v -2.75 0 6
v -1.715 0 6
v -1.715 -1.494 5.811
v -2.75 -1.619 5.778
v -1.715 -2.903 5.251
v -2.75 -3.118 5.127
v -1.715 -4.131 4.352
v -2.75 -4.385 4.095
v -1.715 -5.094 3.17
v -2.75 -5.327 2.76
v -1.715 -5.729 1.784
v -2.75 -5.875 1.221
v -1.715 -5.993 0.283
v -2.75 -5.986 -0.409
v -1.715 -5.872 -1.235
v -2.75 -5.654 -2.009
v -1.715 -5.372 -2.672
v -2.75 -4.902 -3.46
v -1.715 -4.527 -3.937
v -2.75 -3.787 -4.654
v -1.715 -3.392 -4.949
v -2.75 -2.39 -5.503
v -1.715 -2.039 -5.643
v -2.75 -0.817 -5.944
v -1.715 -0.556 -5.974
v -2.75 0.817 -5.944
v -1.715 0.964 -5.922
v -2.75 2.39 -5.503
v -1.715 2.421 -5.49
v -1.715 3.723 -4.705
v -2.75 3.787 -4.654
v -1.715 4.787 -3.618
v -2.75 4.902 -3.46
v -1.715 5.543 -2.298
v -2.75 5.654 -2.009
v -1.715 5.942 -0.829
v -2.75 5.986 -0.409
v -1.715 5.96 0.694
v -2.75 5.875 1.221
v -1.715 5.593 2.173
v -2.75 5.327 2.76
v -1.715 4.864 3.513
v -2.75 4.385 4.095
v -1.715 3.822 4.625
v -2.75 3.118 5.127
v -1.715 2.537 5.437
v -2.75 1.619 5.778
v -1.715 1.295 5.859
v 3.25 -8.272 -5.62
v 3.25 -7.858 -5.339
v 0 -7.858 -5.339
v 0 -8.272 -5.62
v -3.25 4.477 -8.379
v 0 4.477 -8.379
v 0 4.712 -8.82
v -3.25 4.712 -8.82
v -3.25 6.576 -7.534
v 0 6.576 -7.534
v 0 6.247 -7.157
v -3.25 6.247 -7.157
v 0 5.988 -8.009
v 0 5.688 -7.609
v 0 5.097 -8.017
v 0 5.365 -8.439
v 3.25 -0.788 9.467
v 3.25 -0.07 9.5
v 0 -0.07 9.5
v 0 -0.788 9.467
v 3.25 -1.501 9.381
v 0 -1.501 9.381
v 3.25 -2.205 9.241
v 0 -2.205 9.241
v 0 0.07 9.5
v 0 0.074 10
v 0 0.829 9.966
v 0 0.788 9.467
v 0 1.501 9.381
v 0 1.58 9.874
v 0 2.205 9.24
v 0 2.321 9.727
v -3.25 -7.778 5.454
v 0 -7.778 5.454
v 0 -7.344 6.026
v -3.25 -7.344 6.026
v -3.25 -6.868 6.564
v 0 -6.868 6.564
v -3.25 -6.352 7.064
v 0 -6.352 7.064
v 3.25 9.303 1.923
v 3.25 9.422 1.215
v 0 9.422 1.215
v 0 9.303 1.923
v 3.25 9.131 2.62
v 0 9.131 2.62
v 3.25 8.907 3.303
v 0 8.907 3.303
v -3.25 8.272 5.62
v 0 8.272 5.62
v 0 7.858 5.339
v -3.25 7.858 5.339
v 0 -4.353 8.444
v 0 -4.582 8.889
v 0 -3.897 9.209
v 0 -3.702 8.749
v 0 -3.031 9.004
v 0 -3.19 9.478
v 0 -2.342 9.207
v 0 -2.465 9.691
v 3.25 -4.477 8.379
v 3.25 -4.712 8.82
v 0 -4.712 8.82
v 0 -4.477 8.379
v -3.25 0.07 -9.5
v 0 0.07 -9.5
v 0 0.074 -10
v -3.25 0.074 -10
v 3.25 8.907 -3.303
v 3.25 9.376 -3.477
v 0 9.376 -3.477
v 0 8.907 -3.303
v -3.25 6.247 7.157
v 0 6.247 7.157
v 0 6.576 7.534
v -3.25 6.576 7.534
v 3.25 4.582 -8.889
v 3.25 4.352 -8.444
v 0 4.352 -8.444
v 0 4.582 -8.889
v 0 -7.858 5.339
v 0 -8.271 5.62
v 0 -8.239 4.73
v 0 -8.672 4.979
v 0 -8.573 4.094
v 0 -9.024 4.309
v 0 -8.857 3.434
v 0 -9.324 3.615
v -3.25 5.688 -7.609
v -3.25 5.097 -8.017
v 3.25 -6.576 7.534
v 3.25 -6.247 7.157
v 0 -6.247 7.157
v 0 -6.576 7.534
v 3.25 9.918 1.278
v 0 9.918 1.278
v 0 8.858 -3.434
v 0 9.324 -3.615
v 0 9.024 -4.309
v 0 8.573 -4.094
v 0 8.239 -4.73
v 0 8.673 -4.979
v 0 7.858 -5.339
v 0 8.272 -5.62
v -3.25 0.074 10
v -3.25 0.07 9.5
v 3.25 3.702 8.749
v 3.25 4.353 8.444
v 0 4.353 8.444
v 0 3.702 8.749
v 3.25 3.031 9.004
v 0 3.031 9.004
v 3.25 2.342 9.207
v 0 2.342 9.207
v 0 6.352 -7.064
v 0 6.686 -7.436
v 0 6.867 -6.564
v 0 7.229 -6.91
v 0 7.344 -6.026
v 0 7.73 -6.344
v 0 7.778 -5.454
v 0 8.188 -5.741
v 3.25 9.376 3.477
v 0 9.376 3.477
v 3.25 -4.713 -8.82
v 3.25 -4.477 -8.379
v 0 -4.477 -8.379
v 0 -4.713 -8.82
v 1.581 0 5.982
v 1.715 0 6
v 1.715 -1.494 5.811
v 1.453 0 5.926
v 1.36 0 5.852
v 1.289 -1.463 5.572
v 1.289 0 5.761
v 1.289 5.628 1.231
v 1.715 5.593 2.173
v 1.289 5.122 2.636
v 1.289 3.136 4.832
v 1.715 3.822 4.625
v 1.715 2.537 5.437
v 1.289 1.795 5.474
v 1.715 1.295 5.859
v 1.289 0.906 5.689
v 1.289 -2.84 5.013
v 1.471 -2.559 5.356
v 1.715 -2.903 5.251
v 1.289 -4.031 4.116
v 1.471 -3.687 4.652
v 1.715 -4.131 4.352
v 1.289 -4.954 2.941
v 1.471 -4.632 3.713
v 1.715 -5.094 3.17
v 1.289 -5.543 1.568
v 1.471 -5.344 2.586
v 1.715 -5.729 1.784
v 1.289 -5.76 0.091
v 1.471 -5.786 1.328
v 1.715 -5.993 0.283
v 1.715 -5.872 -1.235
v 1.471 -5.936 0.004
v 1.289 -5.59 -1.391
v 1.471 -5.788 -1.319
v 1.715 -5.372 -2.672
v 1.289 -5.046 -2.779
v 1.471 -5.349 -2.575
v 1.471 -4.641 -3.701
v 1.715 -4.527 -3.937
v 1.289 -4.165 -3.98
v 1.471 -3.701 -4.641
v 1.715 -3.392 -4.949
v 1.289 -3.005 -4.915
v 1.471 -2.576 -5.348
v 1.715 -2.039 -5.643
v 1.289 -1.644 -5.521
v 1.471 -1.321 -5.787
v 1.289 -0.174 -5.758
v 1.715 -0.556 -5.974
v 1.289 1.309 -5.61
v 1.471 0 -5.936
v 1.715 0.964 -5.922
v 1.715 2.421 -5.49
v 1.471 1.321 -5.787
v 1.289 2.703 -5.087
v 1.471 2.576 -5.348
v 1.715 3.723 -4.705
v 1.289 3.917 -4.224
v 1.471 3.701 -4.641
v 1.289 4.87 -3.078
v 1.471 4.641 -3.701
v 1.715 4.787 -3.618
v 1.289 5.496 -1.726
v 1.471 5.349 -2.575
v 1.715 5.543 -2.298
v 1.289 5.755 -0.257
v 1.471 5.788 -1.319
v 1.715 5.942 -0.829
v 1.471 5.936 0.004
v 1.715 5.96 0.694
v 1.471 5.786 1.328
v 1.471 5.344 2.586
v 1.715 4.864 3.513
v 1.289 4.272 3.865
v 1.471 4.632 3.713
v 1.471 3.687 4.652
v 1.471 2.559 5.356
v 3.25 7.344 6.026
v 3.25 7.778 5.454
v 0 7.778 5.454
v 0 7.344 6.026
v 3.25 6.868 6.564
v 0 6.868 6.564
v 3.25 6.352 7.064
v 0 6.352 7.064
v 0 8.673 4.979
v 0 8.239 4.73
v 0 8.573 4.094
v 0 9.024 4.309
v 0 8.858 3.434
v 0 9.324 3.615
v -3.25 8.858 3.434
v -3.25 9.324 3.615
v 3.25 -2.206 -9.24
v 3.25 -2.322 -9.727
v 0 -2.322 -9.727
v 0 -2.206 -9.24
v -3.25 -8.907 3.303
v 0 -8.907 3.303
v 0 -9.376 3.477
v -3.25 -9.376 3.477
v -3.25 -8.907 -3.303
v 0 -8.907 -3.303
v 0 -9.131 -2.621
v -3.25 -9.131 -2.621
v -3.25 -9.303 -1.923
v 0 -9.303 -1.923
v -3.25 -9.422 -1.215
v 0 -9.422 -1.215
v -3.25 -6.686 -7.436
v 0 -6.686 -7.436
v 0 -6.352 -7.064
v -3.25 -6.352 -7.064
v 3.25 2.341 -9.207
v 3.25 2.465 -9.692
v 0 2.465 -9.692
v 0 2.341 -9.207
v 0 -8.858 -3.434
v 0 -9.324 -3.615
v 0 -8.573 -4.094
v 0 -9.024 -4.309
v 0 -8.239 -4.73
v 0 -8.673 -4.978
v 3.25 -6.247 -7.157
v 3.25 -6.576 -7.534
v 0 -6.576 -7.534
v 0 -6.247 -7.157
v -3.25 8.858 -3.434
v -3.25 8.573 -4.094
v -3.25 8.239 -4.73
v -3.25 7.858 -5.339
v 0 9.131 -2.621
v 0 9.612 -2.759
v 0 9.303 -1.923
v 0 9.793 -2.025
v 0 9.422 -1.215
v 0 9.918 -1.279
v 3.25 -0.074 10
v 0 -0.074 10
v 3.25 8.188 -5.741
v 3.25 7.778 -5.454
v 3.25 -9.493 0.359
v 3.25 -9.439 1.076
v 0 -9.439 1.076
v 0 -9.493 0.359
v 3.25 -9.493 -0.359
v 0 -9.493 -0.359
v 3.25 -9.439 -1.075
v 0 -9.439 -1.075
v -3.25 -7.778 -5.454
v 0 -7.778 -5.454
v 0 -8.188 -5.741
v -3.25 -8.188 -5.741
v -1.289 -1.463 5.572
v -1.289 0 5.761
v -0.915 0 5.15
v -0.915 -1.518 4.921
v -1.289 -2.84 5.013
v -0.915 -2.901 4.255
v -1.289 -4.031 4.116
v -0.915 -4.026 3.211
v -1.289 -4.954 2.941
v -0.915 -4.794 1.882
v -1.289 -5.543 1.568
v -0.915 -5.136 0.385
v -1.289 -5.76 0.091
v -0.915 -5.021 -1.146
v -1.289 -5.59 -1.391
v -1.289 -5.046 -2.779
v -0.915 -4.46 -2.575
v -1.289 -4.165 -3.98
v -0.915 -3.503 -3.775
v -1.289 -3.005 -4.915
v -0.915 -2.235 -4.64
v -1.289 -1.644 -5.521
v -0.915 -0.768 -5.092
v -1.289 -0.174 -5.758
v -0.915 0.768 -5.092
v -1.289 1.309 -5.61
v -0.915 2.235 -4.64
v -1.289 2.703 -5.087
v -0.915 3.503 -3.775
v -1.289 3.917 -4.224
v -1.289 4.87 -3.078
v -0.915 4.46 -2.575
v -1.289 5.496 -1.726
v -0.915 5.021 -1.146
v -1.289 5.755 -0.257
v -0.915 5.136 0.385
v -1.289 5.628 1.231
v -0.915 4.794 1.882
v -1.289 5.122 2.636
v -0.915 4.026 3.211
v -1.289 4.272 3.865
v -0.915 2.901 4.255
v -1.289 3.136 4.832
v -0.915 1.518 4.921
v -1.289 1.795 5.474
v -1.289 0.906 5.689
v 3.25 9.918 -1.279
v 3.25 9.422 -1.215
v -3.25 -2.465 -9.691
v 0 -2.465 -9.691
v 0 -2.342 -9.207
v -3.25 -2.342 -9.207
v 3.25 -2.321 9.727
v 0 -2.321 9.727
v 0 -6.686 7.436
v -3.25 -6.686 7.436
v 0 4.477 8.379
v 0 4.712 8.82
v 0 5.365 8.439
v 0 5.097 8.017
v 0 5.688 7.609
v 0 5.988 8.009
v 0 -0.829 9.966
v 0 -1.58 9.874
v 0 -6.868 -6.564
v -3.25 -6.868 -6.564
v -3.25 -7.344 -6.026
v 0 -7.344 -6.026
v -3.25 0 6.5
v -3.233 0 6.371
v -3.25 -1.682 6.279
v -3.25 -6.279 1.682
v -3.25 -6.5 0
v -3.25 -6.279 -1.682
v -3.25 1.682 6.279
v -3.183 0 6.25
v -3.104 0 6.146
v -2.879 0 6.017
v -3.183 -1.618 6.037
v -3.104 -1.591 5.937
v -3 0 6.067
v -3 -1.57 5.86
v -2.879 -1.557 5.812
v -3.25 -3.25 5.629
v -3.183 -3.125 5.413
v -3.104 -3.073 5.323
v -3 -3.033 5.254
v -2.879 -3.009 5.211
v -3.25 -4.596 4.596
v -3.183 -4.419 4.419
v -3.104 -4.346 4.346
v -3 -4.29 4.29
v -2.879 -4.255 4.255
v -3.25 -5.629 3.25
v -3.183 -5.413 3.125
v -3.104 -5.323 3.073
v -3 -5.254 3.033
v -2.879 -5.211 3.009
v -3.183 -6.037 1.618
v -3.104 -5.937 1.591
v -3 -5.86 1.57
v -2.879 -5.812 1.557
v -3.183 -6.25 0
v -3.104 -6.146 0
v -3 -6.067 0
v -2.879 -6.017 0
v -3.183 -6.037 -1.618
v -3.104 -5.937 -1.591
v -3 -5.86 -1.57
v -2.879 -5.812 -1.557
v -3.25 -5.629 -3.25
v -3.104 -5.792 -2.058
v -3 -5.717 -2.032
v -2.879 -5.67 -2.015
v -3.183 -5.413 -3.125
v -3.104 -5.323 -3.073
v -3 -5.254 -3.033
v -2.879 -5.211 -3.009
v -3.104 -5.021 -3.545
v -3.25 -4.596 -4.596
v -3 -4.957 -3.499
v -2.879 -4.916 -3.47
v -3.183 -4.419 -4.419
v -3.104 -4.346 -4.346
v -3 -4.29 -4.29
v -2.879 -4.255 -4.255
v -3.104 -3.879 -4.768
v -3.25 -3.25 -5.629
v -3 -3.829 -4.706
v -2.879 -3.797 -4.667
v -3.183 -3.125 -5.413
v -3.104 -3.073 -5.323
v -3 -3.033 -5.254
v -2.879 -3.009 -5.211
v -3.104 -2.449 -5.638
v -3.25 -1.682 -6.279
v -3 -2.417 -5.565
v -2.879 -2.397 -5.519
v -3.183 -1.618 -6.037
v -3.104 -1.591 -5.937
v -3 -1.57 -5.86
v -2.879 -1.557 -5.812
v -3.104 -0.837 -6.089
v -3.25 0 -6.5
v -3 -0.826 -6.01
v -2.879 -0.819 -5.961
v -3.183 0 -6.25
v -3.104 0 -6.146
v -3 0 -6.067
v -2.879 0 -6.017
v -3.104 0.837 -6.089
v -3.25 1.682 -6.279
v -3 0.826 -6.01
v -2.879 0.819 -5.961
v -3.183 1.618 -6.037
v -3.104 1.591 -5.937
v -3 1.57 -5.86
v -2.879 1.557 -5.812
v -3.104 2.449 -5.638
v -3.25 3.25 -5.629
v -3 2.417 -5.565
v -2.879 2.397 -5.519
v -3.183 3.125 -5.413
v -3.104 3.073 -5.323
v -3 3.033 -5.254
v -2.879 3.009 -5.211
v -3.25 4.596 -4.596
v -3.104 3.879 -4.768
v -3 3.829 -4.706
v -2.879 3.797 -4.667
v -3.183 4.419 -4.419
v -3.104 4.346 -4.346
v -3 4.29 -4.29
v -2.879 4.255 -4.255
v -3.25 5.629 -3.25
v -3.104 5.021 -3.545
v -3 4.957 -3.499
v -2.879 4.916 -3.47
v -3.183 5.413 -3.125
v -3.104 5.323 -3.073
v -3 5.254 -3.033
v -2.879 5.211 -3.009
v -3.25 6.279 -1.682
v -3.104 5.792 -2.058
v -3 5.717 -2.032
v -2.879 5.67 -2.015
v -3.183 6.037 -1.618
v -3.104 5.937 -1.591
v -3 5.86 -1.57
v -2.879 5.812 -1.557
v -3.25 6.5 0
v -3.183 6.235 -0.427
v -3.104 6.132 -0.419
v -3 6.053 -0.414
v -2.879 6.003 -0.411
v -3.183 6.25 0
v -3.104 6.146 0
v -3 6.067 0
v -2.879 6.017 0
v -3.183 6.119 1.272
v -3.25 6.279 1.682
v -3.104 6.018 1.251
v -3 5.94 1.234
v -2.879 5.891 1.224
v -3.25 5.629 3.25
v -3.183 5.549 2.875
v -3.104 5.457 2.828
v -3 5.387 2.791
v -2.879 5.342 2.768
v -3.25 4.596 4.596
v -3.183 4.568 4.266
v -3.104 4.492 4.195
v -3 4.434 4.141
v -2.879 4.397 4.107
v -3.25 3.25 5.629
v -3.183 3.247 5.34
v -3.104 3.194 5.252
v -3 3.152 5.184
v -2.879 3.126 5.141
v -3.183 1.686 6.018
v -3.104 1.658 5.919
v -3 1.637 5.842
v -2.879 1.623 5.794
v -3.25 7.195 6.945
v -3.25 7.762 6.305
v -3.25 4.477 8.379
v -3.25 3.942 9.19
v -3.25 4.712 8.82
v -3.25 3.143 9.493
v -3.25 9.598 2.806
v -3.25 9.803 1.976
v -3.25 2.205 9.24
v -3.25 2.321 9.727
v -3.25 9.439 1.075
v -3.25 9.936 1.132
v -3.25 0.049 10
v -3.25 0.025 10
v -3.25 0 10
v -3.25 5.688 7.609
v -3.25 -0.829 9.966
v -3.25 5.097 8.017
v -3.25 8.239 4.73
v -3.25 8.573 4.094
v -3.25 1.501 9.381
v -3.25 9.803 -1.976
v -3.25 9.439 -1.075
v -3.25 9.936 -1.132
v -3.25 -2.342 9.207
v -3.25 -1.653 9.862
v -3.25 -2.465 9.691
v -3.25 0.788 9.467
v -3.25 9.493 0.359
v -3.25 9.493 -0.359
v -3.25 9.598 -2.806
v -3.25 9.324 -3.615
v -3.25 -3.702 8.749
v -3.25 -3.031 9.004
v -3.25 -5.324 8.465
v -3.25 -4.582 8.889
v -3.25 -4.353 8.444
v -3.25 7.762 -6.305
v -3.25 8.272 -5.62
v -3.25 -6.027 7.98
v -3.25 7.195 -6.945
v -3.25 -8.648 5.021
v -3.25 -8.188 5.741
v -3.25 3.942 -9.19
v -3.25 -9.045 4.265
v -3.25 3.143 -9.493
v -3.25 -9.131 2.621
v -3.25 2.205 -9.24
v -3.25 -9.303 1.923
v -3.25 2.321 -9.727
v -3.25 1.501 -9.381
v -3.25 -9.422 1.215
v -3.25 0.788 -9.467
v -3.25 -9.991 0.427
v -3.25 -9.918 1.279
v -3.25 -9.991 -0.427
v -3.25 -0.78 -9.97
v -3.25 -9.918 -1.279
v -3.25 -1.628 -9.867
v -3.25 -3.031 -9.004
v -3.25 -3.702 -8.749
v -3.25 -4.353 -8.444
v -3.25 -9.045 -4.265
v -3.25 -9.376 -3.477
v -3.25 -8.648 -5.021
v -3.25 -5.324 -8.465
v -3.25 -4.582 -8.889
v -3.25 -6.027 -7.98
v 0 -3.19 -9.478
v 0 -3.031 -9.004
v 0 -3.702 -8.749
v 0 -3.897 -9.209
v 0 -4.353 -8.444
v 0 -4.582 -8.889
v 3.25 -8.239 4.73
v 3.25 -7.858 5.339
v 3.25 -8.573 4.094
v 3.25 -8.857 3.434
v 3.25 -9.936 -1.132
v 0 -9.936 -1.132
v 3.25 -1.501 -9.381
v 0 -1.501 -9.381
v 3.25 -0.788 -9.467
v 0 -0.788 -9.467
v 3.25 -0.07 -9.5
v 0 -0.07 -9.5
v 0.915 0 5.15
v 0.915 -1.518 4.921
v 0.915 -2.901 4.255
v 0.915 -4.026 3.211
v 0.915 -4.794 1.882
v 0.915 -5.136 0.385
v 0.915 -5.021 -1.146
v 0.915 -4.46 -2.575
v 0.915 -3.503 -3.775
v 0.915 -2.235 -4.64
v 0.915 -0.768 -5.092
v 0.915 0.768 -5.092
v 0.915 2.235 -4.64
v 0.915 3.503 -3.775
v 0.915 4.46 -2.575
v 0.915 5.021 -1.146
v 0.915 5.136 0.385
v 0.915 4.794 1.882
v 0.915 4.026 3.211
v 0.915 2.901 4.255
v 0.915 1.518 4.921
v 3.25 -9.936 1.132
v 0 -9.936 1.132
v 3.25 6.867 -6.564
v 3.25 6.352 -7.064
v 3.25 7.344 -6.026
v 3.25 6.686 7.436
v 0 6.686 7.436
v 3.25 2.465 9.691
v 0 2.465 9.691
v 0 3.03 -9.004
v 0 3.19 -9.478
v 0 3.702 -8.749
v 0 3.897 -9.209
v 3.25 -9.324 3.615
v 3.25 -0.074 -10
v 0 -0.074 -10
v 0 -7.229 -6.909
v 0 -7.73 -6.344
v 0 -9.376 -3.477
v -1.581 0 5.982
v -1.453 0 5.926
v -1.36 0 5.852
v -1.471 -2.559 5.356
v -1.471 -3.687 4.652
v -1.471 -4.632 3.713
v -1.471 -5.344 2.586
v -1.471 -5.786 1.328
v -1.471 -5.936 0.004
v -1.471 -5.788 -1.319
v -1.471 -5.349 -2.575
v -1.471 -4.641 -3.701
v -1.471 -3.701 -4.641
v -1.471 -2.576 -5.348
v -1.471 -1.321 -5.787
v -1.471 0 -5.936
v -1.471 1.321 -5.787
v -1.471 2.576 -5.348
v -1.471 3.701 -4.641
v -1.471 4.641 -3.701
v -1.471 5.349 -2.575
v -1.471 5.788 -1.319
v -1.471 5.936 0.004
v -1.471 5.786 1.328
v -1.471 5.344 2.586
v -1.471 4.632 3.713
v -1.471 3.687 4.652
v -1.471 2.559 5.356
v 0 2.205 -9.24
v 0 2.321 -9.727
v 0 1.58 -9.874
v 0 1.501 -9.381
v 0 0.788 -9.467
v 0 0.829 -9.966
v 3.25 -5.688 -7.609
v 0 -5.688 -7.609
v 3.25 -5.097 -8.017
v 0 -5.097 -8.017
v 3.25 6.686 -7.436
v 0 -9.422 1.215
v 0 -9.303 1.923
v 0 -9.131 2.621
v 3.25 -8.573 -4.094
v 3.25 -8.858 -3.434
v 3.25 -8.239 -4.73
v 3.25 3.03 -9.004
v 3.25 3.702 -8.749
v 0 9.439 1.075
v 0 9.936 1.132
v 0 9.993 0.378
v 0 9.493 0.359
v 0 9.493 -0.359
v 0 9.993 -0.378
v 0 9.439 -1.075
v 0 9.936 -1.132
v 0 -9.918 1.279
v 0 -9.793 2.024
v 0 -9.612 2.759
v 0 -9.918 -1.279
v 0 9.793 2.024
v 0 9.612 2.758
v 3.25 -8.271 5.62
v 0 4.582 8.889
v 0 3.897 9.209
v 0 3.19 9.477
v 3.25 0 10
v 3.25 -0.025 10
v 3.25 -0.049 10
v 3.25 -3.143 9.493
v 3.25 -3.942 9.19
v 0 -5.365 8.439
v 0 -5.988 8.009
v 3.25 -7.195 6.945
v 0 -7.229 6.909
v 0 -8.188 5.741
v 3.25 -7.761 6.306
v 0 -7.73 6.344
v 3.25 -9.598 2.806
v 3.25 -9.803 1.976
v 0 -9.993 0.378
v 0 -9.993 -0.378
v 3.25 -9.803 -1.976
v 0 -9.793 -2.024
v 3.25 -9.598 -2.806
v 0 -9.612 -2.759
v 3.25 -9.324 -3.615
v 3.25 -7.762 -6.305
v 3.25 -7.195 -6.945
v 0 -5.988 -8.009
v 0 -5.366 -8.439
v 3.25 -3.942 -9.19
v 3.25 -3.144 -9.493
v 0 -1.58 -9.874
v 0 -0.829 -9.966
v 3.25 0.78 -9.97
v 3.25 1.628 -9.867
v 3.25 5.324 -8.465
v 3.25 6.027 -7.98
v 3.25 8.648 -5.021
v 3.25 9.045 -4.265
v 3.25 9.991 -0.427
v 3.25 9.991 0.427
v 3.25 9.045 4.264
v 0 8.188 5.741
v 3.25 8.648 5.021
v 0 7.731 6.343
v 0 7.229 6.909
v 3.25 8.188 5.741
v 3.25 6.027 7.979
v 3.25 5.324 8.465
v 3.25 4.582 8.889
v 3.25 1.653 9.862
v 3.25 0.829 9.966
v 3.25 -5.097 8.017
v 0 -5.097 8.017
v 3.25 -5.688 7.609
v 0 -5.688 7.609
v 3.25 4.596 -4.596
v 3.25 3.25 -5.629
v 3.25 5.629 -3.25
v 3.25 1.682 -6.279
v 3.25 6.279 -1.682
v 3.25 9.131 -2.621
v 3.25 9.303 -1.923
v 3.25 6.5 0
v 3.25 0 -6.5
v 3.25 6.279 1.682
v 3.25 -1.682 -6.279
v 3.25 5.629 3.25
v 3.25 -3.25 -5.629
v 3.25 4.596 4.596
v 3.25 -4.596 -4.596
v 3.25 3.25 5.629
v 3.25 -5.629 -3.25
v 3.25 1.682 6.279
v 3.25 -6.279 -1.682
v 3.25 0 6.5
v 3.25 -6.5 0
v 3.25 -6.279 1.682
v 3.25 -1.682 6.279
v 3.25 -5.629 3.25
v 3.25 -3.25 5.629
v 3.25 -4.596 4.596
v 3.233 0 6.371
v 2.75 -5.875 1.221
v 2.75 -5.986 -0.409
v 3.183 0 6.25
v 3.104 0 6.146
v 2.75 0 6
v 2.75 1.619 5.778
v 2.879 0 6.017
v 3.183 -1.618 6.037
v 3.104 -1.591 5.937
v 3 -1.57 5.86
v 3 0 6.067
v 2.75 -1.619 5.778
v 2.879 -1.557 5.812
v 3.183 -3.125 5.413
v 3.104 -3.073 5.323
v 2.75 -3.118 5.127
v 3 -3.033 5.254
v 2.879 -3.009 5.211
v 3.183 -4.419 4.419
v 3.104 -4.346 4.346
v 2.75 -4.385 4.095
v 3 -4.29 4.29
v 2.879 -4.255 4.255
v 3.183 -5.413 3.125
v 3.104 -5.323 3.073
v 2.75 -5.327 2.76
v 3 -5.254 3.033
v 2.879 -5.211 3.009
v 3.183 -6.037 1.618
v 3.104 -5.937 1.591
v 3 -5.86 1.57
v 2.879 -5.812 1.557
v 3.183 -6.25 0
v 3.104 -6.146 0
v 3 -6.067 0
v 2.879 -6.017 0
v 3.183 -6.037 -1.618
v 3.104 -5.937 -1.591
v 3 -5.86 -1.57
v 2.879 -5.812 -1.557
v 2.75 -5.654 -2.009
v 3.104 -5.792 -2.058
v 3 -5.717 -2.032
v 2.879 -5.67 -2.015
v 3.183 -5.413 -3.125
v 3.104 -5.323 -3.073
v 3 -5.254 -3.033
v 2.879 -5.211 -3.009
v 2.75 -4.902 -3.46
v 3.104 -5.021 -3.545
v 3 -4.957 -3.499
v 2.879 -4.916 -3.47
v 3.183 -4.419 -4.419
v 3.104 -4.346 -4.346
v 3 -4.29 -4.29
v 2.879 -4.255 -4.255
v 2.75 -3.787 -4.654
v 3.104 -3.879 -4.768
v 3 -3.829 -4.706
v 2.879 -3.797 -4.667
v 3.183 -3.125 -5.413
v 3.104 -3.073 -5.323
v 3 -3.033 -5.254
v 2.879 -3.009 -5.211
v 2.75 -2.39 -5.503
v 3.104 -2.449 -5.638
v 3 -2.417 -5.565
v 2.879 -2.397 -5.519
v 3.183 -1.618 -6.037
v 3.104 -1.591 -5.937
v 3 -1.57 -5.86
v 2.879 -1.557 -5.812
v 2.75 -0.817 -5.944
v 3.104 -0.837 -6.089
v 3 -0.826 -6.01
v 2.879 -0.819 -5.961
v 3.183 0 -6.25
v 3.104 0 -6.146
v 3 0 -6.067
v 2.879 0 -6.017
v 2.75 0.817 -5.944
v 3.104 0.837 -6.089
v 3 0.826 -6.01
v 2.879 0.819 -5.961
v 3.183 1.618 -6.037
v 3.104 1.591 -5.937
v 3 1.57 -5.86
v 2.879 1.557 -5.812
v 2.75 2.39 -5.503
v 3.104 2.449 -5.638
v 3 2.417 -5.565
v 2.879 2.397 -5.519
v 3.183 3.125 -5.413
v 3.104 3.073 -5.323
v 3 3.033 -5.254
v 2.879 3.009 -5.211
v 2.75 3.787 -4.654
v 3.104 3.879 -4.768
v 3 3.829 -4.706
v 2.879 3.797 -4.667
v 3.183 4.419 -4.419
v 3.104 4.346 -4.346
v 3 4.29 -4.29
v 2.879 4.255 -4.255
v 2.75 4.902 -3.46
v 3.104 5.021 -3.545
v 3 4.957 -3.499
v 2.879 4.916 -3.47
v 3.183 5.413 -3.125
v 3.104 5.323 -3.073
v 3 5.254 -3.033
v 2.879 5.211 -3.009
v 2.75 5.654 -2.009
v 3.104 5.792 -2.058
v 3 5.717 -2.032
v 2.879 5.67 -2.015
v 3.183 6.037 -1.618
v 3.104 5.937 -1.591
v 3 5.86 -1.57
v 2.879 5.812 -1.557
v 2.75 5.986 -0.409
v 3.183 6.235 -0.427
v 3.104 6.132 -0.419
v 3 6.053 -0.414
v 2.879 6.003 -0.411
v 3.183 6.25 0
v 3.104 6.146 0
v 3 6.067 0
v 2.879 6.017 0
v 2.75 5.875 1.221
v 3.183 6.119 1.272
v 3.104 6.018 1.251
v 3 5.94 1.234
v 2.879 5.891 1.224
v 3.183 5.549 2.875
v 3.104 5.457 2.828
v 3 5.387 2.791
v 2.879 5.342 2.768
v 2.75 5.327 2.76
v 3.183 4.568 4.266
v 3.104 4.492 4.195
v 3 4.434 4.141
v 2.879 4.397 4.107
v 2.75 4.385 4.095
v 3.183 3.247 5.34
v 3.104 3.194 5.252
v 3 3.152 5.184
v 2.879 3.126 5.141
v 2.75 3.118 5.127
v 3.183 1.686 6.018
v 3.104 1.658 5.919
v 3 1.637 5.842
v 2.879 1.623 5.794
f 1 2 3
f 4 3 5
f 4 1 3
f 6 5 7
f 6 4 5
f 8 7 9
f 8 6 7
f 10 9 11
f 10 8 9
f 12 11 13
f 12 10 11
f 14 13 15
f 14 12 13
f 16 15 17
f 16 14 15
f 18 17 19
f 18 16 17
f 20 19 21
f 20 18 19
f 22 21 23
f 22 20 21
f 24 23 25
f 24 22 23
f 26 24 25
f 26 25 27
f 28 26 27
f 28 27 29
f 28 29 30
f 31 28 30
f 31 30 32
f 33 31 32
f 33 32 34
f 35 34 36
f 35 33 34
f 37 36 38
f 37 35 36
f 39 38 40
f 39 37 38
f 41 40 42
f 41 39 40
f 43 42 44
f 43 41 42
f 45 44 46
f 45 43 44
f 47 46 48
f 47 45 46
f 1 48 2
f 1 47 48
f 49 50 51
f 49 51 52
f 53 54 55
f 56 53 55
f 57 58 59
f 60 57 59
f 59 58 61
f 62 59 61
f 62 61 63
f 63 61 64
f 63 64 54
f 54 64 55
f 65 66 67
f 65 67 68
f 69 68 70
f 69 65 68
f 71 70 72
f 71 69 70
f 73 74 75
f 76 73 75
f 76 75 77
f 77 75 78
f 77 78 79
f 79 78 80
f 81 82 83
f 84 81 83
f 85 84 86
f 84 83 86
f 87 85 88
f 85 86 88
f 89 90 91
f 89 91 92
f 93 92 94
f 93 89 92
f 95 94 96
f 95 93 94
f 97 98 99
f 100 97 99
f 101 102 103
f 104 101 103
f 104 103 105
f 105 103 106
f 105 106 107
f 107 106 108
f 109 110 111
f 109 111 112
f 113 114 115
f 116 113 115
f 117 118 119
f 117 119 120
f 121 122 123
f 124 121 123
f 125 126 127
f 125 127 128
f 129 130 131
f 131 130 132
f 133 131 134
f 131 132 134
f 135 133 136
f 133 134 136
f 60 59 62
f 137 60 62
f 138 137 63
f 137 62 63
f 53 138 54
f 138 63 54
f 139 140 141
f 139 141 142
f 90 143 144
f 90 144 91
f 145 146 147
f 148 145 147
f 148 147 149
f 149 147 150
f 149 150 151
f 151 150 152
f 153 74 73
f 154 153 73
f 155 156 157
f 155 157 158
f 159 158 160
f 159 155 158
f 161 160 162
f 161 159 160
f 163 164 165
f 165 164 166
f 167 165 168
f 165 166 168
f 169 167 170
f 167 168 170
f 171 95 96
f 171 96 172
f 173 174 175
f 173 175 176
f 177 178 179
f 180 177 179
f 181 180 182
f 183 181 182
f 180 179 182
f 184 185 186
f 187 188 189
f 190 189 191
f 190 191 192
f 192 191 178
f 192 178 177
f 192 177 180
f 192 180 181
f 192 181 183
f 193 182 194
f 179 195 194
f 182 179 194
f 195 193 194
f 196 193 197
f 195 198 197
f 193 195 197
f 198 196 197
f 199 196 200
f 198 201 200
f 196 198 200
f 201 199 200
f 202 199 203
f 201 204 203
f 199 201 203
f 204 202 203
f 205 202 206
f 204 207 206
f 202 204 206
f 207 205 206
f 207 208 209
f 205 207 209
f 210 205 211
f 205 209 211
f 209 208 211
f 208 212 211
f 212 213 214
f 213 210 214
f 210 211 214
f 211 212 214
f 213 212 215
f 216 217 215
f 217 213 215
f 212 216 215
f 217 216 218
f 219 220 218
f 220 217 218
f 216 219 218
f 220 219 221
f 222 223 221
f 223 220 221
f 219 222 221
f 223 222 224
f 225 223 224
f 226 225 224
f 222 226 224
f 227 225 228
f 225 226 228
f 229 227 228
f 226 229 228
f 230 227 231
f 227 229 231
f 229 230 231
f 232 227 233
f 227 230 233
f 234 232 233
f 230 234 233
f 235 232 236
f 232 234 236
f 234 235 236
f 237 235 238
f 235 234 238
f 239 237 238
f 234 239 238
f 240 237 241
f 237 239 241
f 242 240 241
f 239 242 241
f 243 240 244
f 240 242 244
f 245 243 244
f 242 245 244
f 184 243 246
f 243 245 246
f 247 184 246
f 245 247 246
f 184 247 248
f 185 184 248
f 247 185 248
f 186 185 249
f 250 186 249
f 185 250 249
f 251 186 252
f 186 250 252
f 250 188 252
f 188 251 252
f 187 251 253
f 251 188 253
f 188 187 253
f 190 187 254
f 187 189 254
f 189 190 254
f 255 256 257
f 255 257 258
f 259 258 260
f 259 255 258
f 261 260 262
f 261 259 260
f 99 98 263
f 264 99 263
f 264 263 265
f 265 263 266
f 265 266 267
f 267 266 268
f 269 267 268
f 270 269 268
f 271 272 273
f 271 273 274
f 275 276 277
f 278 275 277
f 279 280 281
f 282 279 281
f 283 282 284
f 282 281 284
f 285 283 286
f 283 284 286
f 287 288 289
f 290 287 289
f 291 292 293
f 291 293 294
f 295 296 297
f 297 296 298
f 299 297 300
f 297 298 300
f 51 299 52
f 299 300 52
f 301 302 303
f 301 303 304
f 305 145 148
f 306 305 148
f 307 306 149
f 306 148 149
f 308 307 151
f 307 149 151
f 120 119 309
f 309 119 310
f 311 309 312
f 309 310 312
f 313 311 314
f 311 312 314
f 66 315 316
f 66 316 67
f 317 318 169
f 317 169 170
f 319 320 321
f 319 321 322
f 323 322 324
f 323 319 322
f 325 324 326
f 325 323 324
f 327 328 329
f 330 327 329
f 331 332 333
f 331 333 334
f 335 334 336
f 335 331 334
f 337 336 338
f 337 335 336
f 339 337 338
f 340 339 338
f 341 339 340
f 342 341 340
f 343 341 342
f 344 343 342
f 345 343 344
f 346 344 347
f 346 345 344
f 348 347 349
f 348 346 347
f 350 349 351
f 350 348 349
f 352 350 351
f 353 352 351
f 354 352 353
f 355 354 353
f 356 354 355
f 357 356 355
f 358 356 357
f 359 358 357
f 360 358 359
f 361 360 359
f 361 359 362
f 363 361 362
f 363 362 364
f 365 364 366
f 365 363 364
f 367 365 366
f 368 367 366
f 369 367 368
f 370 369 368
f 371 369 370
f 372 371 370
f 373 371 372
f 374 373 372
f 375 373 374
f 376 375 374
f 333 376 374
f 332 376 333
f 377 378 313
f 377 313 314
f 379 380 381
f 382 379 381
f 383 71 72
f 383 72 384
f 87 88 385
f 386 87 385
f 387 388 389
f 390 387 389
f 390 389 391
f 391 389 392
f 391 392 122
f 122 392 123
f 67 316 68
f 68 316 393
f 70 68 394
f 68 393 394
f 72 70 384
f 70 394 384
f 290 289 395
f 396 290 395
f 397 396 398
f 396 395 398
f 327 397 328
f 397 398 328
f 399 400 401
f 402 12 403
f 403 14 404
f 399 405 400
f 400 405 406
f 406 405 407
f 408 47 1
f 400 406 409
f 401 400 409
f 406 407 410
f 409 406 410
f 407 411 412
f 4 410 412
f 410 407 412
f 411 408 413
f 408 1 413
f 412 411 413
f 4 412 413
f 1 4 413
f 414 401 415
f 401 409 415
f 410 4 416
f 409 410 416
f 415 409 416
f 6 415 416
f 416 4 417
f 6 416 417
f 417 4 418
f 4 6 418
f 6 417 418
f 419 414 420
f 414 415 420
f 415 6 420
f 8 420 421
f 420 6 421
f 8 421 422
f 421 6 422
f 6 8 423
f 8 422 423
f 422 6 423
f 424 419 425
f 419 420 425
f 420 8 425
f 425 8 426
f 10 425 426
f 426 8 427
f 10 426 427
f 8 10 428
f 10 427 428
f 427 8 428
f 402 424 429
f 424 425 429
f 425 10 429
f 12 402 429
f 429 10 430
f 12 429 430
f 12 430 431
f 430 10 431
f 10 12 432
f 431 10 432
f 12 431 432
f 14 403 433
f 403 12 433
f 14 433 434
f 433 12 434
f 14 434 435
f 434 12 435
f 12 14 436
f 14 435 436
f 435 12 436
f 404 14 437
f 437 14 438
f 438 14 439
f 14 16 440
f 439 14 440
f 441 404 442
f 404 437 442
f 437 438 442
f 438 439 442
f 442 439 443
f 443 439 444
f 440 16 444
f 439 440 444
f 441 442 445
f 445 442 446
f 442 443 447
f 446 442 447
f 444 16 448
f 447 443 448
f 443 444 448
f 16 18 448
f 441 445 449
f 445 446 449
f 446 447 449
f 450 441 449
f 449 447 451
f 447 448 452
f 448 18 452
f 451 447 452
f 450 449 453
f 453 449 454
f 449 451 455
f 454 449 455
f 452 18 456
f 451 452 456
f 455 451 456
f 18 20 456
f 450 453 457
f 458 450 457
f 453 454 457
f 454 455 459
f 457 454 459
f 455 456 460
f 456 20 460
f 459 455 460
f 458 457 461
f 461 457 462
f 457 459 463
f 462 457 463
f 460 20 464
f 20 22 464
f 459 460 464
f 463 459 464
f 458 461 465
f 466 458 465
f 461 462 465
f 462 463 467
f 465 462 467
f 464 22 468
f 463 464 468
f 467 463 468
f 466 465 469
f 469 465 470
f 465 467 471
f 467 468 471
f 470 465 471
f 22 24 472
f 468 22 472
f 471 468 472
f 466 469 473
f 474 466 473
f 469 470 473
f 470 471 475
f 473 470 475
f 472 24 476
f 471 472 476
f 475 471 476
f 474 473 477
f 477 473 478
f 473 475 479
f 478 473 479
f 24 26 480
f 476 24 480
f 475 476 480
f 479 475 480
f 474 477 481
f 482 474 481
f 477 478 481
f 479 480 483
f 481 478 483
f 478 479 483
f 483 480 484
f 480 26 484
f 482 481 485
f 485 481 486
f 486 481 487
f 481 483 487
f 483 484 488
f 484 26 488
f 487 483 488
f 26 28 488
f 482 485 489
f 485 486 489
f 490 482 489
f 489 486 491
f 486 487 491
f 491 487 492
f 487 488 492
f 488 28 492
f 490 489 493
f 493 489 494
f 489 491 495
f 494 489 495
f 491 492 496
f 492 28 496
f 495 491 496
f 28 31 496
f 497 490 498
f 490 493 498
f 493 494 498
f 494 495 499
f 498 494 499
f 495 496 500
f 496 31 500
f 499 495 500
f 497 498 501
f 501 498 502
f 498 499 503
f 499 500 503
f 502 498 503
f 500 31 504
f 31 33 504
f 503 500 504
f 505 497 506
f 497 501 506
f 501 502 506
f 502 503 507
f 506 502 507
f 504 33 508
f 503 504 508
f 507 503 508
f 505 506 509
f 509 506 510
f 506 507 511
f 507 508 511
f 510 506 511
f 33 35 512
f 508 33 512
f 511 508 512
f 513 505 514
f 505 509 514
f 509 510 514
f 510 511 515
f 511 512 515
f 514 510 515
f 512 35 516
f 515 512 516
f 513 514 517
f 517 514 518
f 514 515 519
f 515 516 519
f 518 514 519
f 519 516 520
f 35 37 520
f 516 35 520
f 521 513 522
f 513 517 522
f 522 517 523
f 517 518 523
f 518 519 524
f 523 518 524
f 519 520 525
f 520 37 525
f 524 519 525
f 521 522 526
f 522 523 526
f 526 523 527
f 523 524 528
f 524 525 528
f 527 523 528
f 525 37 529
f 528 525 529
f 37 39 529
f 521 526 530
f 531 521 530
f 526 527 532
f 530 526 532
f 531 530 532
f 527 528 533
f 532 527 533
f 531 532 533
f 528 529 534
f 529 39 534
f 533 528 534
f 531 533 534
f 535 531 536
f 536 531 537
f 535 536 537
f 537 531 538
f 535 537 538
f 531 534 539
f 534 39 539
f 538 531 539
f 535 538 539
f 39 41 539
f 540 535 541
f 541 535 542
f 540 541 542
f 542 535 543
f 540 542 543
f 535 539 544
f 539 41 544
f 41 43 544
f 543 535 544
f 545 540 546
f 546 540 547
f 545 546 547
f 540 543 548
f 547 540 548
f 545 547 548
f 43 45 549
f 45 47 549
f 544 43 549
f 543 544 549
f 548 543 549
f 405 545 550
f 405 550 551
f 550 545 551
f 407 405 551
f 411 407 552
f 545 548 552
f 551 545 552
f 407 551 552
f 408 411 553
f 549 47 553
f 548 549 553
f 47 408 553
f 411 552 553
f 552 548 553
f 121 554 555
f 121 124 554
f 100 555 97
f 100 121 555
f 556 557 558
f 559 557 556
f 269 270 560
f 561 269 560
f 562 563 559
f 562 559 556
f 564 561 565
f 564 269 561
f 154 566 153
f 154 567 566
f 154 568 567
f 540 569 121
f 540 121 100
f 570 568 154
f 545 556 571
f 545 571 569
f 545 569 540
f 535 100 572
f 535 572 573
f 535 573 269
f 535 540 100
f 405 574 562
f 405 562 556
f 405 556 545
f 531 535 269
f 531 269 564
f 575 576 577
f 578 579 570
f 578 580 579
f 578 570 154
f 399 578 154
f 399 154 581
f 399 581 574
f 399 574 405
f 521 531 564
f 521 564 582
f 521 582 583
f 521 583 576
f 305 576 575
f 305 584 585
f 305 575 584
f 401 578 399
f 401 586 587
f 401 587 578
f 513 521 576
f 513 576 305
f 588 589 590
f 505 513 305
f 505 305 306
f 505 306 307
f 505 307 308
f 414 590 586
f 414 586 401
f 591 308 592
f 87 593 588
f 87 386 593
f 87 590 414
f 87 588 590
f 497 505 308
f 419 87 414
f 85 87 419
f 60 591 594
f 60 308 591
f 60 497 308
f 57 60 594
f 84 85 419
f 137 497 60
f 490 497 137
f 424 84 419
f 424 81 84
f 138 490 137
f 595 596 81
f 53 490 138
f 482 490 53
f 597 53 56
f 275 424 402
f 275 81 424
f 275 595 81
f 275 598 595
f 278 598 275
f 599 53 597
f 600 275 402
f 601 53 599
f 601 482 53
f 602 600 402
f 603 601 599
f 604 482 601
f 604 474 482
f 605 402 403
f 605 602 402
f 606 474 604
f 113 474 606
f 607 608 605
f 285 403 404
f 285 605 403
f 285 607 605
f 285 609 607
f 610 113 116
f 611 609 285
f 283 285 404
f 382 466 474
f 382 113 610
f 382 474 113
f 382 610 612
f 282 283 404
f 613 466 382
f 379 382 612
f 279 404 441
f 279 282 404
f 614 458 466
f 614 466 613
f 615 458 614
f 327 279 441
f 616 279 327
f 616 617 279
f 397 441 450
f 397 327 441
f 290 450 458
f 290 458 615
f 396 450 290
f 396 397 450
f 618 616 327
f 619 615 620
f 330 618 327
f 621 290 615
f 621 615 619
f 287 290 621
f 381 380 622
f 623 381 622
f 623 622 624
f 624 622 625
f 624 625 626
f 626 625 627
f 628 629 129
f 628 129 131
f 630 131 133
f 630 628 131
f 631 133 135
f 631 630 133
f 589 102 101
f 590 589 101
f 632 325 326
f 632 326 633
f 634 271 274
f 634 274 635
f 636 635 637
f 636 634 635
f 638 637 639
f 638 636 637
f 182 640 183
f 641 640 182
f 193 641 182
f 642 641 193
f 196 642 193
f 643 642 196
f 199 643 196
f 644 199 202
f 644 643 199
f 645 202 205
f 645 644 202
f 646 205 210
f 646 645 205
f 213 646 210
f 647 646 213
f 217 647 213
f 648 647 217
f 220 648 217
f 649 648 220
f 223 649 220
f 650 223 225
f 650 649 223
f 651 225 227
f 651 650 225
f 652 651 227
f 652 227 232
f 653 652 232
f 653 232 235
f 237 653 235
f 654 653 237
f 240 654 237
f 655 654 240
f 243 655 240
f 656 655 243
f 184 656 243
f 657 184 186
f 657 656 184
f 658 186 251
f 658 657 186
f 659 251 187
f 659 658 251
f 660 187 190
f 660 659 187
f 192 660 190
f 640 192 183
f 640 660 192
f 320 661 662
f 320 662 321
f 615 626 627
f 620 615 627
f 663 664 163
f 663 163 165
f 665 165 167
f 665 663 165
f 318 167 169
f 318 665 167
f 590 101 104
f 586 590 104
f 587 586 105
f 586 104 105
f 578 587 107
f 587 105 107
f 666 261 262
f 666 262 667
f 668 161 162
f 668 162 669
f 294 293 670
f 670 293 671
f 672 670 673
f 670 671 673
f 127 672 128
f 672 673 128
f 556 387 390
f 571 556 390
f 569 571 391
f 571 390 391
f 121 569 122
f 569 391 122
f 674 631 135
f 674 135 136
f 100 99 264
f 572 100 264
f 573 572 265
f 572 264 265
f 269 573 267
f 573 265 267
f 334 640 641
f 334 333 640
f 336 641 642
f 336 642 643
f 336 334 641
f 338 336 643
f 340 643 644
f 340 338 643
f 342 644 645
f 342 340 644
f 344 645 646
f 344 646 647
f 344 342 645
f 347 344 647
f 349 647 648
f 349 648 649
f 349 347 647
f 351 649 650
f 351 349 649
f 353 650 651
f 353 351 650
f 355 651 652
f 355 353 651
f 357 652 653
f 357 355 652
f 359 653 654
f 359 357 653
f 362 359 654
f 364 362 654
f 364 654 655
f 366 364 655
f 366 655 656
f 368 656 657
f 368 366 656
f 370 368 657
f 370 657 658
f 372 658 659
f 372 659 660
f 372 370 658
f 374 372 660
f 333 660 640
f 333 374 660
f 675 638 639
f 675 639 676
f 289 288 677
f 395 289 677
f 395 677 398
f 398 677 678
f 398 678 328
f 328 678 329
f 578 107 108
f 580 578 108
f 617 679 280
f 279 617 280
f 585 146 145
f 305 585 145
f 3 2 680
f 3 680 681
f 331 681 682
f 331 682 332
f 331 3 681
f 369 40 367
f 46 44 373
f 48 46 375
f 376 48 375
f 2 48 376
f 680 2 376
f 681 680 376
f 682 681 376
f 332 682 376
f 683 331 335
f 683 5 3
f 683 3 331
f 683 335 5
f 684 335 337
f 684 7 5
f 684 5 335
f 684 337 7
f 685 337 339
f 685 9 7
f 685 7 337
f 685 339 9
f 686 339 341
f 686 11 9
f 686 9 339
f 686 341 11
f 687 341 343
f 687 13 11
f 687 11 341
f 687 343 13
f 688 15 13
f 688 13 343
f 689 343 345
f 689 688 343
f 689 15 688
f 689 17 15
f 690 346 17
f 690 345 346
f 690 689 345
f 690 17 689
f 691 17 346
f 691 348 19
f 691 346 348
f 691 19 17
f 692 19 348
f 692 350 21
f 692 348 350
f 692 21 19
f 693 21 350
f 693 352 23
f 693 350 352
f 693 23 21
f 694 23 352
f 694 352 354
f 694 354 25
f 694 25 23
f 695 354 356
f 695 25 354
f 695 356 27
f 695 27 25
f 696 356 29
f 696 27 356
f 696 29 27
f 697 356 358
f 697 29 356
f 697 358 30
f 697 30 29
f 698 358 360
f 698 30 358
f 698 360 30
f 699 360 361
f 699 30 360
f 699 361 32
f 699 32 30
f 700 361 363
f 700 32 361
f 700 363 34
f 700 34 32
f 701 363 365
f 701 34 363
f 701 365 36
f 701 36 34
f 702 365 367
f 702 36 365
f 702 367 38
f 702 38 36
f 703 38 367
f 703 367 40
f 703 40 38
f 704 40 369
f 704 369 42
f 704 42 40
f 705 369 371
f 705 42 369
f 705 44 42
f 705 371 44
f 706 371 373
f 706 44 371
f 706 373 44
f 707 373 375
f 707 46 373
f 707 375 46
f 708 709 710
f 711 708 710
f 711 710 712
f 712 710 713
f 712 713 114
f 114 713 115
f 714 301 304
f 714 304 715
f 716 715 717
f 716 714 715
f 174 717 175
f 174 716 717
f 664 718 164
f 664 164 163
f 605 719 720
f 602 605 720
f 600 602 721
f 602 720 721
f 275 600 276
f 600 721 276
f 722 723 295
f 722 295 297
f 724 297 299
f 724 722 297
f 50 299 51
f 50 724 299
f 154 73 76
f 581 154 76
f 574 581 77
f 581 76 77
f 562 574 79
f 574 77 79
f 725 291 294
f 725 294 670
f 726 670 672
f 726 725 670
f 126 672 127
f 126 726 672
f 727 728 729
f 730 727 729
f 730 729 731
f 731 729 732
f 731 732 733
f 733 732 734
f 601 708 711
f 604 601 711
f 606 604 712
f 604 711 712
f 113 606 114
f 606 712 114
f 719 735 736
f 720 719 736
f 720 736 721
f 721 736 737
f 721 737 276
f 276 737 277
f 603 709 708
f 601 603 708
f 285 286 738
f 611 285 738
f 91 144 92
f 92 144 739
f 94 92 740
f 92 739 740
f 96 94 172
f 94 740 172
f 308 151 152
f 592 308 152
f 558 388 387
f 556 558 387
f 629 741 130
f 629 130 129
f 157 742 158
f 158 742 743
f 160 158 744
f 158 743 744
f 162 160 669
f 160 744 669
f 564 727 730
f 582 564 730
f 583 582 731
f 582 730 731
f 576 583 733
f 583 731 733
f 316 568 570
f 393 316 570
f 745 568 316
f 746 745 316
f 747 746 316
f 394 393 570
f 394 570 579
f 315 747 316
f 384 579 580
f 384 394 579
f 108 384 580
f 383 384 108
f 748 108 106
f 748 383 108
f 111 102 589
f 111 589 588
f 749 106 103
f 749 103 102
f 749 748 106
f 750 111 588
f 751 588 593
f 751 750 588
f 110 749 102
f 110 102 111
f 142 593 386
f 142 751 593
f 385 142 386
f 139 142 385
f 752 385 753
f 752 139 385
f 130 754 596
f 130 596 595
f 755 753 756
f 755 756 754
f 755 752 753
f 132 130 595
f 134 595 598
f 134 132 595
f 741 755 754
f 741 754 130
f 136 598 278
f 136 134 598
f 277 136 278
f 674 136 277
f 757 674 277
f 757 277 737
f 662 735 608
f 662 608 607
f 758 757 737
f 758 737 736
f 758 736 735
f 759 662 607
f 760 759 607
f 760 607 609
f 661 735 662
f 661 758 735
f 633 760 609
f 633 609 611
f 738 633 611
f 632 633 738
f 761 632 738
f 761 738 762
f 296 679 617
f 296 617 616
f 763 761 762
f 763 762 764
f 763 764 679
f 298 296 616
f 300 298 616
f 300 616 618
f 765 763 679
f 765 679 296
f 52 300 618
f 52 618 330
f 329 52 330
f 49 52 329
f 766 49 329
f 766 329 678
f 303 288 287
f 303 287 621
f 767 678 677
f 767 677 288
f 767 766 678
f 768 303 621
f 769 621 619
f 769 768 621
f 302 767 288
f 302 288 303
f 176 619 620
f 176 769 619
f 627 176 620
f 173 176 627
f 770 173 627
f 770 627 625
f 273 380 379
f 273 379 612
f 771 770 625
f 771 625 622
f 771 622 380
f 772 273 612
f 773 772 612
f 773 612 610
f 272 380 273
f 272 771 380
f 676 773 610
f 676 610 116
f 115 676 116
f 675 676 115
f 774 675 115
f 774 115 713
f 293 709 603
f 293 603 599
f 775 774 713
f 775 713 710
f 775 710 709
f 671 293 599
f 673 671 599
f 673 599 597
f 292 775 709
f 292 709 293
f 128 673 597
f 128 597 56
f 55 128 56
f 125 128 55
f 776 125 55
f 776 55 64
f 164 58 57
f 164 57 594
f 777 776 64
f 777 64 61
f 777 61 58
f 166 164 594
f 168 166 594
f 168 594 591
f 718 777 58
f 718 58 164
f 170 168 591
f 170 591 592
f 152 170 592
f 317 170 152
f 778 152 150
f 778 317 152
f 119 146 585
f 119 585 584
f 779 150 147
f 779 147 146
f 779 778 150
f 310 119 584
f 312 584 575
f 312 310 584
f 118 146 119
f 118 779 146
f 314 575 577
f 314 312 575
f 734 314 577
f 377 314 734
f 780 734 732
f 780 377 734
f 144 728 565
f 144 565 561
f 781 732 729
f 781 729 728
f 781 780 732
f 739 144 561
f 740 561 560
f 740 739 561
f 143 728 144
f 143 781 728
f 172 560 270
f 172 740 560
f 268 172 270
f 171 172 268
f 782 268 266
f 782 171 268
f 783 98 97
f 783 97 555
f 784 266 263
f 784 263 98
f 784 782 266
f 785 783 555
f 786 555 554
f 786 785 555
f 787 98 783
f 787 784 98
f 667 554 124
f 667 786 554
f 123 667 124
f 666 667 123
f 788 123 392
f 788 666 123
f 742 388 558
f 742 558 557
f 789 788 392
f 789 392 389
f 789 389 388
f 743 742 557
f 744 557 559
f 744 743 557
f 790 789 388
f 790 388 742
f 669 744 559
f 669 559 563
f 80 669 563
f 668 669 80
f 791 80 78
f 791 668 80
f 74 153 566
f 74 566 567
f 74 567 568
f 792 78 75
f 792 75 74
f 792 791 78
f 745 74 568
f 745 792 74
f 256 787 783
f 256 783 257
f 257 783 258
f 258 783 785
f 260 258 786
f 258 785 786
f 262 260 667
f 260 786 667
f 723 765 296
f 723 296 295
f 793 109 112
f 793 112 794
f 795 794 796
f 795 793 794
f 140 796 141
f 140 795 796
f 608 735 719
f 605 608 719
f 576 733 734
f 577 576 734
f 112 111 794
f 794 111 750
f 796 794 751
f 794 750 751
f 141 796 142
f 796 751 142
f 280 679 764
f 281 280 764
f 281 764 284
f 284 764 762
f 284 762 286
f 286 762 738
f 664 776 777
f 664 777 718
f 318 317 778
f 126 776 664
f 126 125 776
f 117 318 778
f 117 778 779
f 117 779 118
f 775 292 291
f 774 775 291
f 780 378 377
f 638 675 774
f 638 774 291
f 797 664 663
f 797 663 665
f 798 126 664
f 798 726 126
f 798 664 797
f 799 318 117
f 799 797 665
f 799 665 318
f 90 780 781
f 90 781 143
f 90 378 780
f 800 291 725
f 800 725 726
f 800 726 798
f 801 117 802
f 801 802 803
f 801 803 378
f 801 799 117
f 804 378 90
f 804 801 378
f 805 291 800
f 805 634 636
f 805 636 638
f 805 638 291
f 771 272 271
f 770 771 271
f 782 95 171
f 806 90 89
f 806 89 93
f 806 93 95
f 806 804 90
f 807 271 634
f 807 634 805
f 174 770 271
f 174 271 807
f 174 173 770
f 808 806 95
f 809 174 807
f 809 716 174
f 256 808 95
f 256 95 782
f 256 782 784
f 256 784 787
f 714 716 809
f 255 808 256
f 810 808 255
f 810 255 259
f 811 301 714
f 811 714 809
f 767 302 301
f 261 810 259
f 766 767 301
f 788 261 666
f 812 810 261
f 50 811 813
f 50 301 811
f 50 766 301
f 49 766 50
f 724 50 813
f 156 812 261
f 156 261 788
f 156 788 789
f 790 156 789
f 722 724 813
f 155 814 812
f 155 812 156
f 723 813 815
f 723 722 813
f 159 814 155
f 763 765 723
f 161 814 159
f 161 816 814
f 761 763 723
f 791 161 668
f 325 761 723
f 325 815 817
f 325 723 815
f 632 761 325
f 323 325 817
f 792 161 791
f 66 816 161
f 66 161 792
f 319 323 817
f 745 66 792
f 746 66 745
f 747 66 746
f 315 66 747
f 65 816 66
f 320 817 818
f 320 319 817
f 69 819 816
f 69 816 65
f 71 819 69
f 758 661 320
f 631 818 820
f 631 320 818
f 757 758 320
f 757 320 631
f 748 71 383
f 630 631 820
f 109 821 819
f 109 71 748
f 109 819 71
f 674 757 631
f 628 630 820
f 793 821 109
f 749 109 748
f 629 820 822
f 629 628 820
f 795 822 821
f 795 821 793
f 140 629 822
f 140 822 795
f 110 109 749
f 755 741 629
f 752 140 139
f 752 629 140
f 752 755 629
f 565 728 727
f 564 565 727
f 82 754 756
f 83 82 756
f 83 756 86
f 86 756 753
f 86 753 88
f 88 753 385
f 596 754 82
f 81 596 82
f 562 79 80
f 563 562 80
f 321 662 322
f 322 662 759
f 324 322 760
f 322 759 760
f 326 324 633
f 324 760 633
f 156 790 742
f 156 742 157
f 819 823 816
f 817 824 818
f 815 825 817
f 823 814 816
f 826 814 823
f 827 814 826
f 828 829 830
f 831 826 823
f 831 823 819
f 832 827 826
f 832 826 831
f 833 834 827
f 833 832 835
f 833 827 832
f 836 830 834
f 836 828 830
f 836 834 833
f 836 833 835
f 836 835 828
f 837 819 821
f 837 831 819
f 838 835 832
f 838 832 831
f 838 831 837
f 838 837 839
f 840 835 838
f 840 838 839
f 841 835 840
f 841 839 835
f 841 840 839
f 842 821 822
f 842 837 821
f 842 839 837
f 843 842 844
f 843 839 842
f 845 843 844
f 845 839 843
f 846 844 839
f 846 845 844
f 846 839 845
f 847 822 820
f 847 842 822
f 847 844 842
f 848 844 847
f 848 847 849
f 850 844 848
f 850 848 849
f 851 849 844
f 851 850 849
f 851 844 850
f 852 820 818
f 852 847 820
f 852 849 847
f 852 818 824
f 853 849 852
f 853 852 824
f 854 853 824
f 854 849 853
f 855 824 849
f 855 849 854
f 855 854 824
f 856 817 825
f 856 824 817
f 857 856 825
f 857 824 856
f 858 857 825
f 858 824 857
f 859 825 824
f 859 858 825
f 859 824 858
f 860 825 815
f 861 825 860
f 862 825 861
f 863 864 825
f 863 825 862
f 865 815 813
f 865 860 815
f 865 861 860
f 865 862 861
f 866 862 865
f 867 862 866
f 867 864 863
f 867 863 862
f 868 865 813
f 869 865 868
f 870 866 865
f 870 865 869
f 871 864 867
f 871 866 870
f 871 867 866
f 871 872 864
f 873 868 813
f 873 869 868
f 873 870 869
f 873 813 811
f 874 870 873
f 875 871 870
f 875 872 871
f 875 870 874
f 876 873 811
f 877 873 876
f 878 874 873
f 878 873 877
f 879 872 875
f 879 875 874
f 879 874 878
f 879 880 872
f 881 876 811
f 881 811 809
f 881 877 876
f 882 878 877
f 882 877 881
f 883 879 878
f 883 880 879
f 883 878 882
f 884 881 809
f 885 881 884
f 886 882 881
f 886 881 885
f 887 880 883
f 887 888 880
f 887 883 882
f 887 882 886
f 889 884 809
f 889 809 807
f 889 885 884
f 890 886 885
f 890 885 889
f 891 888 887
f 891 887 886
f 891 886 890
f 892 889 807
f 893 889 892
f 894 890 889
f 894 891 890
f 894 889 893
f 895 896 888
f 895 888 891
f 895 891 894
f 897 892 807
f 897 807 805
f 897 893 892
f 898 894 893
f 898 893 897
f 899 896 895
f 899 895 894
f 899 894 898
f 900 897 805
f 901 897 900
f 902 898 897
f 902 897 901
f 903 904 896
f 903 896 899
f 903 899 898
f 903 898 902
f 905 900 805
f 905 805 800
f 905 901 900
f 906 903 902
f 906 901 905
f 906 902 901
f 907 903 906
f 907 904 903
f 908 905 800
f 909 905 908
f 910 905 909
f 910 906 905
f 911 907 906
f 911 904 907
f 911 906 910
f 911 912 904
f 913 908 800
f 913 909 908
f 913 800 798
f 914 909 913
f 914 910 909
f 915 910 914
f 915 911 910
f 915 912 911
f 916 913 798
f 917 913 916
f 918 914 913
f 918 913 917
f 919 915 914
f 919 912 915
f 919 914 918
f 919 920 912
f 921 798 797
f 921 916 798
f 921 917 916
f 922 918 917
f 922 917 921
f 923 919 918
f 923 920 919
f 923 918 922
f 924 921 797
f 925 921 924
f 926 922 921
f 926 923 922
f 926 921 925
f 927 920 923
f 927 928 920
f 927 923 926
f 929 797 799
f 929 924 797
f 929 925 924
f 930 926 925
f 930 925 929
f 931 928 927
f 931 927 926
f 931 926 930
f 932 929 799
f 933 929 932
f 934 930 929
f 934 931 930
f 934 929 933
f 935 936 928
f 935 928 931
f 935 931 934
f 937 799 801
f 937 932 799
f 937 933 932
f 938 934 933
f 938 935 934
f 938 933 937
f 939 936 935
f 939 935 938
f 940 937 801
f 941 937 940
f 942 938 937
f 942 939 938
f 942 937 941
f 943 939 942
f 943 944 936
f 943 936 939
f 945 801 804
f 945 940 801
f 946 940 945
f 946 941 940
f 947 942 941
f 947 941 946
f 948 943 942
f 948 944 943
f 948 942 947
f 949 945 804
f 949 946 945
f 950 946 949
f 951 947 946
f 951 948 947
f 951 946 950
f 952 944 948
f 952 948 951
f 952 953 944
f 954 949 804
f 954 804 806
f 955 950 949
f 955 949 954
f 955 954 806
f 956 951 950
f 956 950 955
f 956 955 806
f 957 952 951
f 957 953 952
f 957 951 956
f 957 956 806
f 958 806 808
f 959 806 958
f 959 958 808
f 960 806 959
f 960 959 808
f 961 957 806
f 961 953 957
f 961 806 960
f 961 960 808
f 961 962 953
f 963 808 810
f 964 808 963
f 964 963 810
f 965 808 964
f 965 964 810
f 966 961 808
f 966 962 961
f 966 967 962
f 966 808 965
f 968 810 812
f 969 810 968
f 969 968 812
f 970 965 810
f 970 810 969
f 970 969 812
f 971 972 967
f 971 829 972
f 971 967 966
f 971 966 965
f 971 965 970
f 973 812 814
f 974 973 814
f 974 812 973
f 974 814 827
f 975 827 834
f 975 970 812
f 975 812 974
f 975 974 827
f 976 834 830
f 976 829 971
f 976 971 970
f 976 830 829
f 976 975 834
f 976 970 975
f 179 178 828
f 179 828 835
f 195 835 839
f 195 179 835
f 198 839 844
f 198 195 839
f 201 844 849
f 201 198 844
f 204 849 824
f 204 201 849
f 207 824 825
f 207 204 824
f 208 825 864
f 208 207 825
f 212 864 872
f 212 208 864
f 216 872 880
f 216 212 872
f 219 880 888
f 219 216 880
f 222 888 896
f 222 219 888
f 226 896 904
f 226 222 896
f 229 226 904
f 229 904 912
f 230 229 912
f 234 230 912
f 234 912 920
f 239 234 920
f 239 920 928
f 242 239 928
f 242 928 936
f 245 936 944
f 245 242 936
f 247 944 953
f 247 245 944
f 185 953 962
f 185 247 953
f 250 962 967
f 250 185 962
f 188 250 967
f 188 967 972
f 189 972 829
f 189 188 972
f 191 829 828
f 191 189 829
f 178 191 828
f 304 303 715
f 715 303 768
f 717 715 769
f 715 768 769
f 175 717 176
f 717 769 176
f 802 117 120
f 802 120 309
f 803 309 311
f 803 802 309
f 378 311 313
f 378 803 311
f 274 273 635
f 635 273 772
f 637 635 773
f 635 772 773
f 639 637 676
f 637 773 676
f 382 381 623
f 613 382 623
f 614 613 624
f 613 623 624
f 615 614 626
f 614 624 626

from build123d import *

# Parameters (mm, degrees)
CUT_EXTRUDE1_START = -3.25
CUT_EXTRUDE1_DEPTH = 3.25
CIRPATTERN1_COUNT  = 13
CUT_EXTRUDE2_DEPTH = 3.25
CIRPATTERN2_COUNT  = 13
FILLET1_R          = 0.5


with BuildPart() as part:
    # Sketch1 → Revolve1 (revolve)
    with BuildSketch(Plane.XY, mode=Mode.PRIVATE) as revolve1_sk:
        Polygon((-3.25, 10), (3.25, 10), (3.25, 6), (1.435, 6), (0.915, 5.15), (-0.915, 5.15), (-1.435, 6), (-3.25, 6), align=None)
    revolve(revolve1_sk.sketch.rotate(Axis((0, 0, 0), (1, 0, 0)), 90), axis=Axis((0, 0, 0), (1, 0, 0)))

    # Sketch2 → Cut-Extrude1 (cut)
    with BuildSketch(Plane.ZY.offset(3.25).offset(CUT_EXTRUDE1_START)):
        with BuildLine():
            Line((-1.075430531, 9.438932629), (-1.132032138, 9.935718557))
            ThreePointArc((-1.132032138, 9.935718557), (0, 10), (1.132032138, 9.935718557))
            Line((1.132032138, 9.935718557), (1.075430531, 9.438932629))
            ThreePointArc((1.075430531, 9.438932629), (0, 9.5), (-1.075430531, 9.438932629))
        make_face()
    cut_extrude1 = extrude(amount=CUT_EXTRUDE1_DEPTH, mode=Mode.SUBTRACT)

    # CirPattern1: Cut-Extrude1 ×13 about axis
    cirpattern1_axis = Axis((0, 0, 0), (1, 0, 0))
    for i in range(1, CIRPATTERN1_COUNT):
        add(cut_extrude1.rotate(cirpattern1_axis, i * 360 / CIRPATTERN1_COUNT), mode=Mode.SUBTRACT)

    # Sketch3 → Cut-Extrude2 (cut)
    with BuildSketch(Plane(origin=(3.25, 0, 0), x_dir=(0, 0, -1), z_dir=(1, 0, 0))):
        with BuildLine():
            Line((-3.302885527, 8.907353546), (-3.476721607, 9.376161627))
            ThreePointArc((-3.476721607, 9.376161627), (-2.39296111, 9.709466367), (-1.278436014, 9.917943404))
            Line((-1.278436014, 9.917943404), (-1.214514213, 9.422046233))
            ThreePointArc((-1.214514213, 9.422046233), (-2.273313055, 9.223993048), (-3.302885527, 8.907353546))
        make_face()
    cut_extrude2 = extrude(amount=-CUT_EXTRUDE2_DEPTH, mode=Mode.SUBTRACT)

    # CirPattern2: Cut-Extrude2 ×13 about axis
    cirpattern2_axis = Axis((0, 0, 0), (1, 0, 0))
    for i in range(1, CIRPATTERN2_COUNT):
        add(cut_extrude2.rotate(cirpattern2_axis, i * 360 / CIRPATTERN2_COUNT), mode=Mode.SUBTRACT)

    # Fillet1
    fillet1_edges = [part.edges().sort_by_distance(p)[0] for p in [
        (1.435, 0, -6),
        (3.25, 0, -6),
        (-3.25, 0, -6),
        (-1.435, 0, -6),
    ]]
    fillet(fillet1_edges, radius=FILLET1_R)


solid = part.part
